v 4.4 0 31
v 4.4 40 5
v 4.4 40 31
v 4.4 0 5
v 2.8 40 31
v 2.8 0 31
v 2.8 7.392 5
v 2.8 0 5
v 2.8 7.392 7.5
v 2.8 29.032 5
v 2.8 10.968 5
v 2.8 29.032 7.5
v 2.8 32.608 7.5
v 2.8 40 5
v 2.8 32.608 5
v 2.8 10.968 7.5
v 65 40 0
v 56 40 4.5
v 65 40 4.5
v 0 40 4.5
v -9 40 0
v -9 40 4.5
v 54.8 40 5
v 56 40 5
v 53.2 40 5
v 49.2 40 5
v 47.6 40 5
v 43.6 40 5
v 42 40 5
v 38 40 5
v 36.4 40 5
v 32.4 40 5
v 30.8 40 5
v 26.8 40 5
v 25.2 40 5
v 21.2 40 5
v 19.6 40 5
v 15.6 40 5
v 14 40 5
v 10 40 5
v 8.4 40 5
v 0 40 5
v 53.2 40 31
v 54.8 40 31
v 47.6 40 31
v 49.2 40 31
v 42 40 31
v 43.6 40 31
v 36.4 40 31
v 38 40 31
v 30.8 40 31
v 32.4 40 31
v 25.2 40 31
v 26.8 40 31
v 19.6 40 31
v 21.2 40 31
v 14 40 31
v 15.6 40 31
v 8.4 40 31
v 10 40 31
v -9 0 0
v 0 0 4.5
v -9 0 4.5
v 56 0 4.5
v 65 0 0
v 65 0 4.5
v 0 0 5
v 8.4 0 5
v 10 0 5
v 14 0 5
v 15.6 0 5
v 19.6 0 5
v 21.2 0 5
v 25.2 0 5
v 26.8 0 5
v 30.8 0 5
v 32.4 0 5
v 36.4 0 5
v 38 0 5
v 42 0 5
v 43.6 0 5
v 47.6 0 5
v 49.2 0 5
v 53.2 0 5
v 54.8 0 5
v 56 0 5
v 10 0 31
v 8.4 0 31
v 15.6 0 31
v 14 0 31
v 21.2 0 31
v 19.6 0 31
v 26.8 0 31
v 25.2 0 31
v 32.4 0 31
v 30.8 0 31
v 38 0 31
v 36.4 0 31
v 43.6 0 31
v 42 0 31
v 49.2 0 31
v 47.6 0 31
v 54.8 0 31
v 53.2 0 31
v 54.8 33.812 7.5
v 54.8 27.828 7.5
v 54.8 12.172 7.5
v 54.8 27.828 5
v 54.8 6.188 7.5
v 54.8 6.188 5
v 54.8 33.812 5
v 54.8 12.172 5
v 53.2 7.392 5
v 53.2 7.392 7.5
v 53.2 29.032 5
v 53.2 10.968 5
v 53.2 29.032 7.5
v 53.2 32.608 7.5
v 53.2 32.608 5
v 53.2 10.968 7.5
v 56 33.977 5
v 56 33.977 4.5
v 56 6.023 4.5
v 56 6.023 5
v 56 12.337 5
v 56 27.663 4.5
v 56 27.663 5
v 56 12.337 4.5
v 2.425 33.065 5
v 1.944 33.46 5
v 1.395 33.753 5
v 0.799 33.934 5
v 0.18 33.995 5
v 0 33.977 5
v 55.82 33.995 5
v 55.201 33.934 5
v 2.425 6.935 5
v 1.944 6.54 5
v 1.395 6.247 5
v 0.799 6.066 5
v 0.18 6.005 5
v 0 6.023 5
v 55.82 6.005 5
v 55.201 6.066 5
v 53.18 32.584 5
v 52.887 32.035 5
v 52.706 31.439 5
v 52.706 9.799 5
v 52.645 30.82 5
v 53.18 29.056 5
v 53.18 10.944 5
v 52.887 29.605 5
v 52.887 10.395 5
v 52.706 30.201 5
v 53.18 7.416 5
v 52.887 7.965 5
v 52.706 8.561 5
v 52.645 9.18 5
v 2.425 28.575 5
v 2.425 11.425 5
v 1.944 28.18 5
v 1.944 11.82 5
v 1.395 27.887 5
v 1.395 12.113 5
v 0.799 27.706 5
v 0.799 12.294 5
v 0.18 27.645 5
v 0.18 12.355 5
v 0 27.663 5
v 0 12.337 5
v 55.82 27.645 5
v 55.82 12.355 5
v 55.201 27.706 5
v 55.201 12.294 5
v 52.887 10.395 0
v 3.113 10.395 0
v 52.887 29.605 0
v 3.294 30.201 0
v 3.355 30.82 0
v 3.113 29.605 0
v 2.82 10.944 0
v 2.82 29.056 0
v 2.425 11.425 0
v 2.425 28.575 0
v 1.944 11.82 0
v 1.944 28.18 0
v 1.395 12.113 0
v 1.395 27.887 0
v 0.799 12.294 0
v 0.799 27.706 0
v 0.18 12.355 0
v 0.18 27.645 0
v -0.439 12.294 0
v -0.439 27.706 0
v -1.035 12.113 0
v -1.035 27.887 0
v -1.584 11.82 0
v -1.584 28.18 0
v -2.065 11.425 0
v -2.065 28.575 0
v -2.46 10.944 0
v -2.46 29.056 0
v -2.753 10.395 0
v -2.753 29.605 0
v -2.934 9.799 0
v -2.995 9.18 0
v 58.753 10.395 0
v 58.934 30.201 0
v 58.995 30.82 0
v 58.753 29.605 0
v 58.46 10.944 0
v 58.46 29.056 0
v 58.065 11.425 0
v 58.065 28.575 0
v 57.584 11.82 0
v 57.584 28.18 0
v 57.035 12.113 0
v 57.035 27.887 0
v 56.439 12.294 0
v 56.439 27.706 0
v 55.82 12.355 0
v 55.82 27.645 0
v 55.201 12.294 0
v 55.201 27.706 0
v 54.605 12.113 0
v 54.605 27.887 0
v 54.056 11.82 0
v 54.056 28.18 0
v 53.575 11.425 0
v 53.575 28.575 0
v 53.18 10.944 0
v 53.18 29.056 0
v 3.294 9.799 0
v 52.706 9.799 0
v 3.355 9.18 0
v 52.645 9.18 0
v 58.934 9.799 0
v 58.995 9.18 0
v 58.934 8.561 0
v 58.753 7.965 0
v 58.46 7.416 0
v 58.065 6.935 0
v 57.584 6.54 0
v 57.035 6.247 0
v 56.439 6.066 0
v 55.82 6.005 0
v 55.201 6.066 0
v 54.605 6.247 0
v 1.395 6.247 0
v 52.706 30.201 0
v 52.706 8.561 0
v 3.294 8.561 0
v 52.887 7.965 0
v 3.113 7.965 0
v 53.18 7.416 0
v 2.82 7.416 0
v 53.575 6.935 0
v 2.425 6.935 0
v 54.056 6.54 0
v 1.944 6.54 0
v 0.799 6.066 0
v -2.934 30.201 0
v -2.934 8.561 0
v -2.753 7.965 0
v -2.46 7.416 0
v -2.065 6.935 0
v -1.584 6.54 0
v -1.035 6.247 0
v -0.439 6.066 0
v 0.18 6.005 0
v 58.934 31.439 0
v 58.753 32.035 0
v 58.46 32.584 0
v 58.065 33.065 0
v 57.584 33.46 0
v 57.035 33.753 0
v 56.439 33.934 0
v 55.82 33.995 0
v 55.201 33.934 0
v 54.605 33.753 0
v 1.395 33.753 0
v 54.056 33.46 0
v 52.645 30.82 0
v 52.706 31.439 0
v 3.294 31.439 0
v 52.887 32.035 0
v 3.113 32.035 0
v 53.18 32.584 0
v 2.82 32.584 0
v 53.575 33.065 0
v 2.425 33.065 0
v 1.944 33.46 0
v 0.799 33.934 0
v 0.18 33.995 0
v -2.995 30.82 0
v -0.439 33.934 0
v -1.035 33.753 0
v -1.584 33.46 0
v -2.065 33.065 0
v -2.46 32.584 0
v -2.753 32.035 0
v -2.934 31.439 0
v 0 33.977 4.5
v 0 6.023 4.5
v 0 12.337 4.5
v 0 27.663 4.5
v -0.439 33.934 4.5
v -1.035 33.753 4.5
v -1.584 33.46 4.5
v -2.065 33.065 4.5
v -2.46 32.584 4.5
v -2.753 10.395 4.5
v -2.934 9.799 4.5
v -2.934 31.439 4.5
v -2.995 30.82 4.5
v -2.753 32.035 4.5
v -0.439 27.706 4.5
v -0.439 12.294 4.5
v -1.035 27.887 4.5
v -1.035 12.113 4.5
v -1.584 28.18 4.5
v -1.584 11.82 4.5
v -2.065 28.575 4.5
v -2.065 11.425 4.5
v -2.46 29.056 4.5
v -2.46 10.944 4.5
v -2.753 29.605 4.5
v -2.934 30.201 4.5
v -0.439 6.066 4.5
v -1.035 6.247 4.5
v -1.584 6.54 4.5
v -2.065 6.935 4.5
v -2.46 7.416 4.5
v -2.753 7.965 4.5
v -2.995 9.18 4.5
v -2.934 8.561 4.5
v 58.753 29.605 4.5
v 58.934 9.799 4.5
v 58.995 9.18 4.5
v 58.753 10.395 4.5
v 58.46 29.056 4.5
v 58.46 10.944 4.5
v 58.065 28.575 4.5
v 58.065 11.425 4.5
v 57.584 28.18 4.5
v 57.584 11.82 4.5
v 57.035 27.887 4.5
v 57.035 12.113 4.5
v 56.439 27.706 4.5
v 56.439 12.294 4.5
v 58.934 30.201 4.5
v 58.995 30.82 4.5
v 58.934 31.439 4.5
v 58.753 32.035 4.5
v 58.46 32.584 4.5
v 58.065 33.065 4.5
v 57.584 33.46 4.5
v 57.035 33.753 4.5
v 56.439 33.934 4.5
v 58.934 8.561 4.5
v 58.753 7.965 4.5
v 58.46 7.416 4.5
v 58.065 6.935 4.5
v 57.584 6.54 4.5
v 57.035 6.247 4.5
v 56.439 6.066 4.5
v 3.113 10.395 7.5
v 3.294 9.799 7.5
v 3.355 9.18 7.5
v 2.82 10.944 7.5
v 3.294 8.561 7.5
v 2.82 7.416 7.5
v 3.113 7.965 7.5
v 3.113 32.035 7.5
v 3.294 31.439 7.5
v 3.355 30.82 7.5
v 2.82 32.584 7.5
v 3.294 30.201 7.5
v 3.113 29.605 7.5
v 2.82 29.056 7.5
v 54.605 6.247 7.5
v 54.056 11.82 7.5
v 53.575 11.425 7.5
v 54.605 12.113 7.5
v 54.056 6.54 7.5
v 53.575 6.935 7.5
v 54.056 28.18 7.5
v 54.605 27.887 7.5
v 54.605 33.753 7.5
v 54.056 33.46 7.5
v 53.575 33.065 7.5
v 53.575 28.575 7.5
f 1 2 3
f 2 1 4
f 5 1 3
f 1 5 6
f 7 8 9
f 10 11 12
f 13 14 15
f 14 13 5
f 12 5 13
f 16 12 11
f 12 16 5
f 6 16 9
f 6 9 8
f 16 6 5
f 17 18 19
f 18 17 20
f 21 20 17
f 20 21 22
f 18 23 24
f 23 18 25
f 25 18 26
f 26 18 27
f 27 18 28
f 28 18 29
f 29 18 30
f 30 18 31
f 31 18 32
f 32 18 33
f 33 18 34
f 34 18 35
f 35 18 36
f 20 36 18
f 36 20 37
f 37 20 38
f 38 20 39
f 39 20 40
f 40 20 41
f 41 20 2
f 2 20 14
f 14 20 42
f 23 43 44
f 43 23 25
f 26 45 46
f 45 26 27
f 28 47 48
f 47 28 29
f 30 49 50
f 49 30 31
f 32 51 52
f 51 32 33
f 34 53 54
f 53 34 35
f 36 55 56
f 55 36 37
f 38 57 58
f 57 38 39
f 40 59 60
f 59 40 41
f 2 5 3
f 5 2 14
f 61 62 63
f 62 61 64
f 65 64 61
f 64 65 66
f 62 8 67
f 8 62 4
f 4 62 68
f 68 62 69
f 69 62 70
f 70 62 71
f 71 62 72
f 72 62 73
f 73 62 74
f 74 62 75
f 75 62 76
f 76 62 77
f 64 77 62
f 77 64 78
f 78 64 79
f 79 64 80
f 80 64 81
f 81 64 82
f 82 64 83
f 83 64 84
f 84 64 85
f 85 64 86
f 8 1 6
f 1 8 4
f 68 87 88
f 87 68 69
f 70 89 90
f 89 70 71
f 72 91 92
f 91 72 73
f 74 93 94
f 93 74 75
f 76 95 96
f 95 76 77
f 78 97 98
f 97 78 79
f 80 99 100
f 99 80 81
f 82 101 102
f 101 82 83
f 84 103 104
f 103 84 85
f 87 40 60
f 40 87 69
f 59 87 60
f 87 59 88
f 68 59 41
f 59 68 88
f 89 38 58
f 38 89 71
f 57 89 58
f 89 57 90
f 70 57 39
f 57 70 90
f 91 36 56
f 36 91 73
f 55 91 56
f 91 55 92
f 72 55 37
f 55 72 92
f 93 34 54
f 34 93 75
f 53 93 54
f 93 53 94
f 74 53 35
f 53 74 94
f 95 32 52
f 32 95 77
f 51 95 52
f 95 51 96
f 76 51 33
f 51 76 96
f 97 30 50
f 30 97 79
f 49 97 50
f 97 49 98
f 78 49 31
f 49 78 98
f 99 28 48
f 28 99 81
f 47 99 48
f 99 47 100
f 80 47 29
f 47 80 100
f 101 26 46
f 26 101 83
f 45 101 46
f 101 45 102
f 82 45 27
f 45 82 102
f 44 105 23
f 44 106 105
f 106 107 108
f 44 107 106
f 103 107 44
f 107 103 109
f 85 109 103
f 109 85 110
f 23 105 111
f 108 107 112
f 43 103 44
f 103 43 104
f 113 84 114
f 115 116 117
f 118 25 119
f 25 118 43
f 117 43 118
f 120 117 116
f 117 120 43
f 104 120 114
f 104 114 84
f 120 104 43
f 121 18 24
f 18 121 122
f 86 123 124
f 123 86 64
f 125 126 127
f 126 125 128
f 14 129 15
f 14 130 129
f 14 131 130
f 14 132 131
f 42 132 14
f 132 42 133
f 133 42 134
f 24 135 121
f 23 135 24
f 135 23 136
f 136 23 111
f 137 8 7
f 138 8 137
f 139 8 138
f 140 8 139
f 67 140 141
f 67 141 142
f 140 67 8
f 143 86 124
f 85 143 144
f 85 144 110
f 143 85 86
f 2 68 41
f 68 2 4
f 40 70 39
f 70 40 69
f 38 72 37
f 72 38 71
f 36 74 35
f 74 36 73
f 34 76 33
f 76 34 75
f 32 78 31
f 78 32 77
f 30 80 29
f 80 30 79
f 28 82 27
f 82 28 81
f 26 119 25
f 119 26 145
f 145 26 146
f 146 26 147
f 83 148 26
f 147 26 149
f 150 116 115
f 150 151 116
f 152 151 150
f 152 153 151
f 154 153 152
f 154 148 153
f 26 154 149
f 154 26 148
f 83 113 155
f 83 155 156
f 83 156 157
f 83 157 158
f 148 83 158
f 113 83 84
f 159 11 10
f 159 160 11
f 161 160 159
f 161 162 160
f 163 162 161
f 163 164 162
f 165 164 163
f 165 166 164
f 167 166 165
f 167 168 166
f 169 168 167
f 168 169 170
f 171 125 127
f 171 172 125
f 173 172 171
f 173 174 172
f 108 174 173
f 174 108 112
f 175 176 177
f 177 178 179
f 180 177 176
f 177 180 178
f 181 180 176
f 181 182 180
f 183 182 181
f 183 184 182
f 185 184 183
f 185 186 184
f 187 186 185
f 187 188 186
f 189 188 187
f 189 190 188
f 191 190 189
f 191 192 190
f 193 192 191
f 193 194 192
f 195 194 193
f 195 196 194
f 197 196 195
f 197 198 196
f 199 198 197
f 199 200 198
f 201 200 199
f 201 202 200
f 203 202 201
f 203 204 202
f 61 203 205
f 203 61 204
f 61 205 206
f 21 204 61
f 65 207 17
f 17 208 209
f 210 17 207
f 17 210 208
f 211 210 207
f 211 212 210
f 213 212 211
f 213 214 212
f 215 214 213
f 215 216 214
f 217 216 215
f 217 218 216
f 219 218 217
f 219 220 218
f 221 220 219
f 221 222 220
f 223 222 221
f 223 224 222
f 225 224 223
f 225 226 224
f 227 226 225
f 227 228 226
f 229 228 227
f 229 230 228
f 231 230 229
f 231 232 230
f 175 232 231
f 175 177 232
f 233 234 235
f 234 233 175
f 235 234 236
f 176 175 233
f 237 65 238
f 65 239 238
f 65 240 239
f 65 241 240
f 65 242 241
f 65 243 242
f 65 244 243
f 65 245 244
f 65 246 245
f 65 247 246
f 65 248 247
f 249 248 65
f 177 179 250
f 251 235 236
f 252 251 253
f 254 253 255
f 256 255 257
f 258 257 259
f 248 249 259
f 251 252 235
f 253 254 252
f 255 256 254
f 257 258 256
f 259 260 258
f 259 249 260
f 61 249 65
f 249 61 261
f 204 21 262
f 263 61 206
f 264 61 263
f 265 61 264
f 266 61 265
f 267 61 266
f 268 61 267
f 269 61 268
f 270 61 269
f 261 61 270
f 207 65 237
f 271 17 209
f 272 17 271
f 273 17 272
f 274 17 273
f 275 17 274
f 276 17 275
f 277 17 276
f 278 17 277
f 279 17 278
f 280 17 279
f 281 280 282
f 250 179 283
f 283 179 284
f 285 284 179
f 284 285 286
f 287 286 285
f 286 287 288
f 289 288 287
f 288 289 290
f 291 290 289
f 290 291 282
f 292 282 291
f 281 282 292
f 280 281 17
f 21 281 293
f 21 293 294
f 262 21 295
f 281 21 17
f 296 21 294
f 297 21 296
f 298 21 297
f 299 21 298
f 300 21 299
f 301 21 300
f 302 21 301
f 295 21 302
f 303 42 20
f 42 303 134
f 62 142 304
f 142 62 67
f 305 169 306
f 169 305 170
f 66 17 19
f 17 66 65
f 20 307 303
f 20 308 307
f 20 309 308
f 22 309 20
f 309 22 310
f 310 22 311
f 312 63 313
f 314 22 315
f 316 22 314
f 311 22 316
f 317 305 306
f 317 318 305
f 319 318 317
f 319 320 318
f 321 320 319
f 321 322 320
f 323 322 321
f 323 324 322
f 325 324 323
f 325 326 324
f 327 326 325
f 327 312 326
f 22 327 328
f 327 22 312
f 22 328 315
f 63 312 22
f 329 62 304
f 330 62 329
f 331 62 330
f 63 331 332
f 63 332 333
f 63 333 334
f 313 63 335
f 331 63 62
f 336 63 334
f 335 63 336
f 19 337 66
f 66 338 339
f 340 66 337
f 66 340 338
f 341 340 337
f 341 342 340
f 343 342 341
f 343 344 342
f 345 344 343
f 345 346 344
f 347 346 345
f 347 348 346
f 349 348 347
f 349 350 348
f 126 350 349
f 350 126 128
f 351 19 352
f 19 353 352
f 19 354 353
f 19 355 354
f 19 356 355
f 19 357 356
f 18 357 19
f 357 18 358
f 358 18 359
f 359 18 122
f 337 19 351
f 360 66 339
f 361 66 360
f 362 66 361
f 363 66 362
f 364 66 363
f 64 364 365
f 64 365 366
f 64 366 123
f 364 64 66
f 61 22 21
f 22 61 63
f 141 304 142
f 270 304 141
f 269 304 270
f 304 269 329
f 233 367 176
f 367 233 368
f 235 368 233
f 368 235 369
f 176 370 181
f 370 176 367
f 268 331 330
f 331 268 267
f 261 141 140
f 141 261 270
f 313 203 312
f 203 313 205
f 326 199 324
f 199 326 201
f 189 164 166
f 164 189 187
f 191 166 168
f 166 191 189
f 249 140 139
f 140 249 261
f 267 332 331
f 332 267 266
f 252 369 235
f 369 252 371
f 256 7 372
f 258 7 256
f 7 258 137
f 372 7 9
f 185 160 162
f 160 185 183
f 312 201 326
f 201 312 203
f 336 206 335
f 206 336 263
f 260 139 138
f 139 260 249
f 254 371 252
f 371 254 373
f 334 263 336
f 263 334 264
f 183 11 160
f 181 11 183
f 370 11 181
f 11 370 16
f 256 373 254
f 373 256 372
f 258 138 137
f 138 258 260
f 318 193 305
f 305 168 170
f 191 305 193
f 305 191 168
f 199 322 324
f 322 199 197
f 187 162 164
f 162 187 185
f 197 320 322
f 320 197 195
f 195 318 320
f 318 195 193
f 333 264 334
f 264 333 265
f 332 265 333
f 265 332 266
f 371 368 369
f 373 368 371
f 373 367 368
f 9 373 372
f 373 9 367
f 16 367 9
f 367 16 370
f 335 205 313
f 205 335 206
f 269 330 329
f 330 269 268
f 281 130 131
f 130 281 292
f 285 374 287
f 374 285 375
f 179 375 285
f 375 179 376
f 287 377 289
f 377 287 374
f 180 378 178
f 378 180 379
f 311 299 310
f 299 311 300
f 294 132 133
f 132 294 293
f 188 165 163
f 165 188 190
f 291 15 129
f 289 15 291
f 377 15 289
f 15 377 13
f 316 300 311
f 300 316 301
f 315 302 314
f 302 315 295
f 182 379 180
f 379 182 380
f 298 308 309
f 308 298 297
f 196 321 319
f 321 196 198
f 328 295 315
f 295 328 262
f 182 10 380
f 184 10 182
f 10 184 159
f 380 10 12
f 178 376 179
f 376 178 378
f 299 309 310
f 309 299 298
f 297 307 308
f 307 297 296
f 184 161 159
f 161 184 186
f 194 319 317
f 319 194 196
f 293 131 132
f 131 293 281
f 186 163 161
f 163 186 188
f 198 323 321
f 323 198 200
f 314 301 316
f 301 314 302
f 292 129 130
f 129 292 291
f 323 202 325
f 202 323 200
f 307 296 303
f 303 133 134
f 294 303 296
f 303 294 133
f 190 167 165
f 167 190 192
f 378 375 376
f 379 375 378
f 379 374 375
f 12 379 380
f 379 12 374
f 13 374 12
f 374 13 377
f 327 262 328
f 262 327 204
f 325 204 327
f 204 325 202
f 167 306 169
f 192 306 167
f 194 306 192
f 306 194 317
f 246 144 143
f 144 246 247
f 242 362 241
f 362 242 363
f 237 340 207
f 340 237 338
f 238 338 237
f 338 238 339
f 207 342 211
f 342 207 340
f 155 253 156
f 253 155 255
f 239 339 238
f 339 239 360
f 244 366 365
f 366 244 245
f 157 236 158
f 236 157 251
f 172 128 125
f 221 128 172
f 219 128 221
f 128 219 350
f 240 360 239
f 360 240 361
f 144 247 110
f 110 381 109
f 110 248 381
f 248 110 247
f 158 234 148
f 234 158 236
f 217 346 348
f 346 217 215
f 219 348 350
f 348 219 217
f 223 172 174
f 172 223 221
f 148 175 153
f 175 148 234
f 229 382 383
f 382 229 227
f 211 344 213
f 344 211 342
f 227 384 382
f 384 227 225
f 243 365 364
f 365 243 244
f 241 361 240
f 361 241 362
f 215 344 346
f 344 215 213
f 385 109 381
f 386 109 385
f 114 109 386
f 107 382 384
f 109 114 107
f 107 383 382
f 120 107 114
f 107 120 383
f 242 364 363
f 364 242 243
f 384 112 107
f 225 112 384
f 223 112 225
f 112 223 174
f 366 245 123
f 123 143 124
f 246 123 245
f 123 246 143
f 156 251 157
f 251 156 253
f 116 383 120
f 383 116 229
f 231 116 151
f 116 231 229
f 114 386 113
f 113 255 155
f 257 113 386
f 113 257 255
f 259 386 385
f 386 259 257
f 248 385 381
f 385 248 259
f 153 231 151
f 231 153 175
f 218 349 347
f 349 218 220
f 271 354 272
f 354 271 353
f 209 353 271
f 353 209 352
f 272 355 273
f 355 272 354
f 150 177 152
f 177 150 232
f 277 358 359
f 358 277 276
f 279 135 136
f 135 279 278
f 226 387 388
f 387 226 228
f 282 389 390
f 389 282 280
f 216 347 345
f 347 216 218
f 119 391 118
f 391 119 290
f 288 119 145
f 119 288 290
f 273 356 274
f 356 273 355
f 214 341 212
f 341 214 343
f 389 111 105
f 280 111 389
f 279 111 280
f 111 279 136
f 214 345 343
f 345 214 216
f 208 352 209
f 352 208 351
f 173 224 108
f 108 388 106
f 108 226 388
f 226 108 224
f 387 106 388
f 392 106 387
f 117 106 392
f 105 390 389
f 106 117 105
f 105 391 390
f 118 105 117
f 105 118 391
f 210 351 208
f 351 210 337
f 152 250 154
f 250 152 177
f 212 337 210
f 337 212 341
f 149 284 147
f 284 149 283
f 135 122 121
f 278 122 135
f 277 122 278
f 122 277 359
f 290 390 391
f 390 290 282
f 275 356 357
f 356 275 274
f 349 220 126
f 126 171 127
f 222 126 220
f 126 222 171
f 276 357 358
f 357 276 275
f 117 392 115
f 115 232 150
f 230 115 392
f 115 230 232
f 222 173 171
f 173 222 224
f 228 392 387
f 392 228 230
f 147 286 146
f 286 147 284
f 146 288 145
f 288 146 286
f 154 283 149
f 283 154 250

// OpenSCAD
$fn = 32;

// ----------------------------------------------------------------------
// Finned heat sink: 56 x 40 mm base, 26 mm fins
// ----------------------------------------------------------------------

// --- parameters (mm) ---
base_w = 56;              // base width
base_d = 40;              // base depth
base_t = 5;               // base thickness
fin_h = 26;               // fin height above the base
holes_d = 6.35;           // fixing holes
hole_x = 27.82;           // hole offset in x
hole_y = 10.82;           // hole offset in y
fin_t = 1.6;              // fin thickness
fin_pitch = 5.6;          // fin pitch
fin_count = 10;           // number of fins
fin_x0 = 2.8;             // first fin offset
flange_w = 74;            // flange plate width
flange_t = 4;             // flange plate thickness

difference() {
  union() {
    cube([base_w, base_d, base_t]);
    for (i = [0 : fin_count - 1]) {
      translate([fin_x0 + i * fin_pitch, 0, base_t - 0.5]) cube([fin_t, base_d, fin_h + 0.5]);
    }
    /* mounting flange, a wider plate sharing the base bottom */
    translate([(base_w - flange_w) / 2, 0, 0]) cube([flange_w, base_d, flange_t + 0.5]);
  }
  /* fixing holes through the base, 2.5 mm clear on both sides */
  for (hx = [-27.82, 27.82]) {
    for (hy = [-10.82, 10.82]) {
      translate([base_w / 2 + hx, base_d / 2 + hy, -2.5]) cylinder(h = base_t + 5, d = holes_d);
    }
  }
}
